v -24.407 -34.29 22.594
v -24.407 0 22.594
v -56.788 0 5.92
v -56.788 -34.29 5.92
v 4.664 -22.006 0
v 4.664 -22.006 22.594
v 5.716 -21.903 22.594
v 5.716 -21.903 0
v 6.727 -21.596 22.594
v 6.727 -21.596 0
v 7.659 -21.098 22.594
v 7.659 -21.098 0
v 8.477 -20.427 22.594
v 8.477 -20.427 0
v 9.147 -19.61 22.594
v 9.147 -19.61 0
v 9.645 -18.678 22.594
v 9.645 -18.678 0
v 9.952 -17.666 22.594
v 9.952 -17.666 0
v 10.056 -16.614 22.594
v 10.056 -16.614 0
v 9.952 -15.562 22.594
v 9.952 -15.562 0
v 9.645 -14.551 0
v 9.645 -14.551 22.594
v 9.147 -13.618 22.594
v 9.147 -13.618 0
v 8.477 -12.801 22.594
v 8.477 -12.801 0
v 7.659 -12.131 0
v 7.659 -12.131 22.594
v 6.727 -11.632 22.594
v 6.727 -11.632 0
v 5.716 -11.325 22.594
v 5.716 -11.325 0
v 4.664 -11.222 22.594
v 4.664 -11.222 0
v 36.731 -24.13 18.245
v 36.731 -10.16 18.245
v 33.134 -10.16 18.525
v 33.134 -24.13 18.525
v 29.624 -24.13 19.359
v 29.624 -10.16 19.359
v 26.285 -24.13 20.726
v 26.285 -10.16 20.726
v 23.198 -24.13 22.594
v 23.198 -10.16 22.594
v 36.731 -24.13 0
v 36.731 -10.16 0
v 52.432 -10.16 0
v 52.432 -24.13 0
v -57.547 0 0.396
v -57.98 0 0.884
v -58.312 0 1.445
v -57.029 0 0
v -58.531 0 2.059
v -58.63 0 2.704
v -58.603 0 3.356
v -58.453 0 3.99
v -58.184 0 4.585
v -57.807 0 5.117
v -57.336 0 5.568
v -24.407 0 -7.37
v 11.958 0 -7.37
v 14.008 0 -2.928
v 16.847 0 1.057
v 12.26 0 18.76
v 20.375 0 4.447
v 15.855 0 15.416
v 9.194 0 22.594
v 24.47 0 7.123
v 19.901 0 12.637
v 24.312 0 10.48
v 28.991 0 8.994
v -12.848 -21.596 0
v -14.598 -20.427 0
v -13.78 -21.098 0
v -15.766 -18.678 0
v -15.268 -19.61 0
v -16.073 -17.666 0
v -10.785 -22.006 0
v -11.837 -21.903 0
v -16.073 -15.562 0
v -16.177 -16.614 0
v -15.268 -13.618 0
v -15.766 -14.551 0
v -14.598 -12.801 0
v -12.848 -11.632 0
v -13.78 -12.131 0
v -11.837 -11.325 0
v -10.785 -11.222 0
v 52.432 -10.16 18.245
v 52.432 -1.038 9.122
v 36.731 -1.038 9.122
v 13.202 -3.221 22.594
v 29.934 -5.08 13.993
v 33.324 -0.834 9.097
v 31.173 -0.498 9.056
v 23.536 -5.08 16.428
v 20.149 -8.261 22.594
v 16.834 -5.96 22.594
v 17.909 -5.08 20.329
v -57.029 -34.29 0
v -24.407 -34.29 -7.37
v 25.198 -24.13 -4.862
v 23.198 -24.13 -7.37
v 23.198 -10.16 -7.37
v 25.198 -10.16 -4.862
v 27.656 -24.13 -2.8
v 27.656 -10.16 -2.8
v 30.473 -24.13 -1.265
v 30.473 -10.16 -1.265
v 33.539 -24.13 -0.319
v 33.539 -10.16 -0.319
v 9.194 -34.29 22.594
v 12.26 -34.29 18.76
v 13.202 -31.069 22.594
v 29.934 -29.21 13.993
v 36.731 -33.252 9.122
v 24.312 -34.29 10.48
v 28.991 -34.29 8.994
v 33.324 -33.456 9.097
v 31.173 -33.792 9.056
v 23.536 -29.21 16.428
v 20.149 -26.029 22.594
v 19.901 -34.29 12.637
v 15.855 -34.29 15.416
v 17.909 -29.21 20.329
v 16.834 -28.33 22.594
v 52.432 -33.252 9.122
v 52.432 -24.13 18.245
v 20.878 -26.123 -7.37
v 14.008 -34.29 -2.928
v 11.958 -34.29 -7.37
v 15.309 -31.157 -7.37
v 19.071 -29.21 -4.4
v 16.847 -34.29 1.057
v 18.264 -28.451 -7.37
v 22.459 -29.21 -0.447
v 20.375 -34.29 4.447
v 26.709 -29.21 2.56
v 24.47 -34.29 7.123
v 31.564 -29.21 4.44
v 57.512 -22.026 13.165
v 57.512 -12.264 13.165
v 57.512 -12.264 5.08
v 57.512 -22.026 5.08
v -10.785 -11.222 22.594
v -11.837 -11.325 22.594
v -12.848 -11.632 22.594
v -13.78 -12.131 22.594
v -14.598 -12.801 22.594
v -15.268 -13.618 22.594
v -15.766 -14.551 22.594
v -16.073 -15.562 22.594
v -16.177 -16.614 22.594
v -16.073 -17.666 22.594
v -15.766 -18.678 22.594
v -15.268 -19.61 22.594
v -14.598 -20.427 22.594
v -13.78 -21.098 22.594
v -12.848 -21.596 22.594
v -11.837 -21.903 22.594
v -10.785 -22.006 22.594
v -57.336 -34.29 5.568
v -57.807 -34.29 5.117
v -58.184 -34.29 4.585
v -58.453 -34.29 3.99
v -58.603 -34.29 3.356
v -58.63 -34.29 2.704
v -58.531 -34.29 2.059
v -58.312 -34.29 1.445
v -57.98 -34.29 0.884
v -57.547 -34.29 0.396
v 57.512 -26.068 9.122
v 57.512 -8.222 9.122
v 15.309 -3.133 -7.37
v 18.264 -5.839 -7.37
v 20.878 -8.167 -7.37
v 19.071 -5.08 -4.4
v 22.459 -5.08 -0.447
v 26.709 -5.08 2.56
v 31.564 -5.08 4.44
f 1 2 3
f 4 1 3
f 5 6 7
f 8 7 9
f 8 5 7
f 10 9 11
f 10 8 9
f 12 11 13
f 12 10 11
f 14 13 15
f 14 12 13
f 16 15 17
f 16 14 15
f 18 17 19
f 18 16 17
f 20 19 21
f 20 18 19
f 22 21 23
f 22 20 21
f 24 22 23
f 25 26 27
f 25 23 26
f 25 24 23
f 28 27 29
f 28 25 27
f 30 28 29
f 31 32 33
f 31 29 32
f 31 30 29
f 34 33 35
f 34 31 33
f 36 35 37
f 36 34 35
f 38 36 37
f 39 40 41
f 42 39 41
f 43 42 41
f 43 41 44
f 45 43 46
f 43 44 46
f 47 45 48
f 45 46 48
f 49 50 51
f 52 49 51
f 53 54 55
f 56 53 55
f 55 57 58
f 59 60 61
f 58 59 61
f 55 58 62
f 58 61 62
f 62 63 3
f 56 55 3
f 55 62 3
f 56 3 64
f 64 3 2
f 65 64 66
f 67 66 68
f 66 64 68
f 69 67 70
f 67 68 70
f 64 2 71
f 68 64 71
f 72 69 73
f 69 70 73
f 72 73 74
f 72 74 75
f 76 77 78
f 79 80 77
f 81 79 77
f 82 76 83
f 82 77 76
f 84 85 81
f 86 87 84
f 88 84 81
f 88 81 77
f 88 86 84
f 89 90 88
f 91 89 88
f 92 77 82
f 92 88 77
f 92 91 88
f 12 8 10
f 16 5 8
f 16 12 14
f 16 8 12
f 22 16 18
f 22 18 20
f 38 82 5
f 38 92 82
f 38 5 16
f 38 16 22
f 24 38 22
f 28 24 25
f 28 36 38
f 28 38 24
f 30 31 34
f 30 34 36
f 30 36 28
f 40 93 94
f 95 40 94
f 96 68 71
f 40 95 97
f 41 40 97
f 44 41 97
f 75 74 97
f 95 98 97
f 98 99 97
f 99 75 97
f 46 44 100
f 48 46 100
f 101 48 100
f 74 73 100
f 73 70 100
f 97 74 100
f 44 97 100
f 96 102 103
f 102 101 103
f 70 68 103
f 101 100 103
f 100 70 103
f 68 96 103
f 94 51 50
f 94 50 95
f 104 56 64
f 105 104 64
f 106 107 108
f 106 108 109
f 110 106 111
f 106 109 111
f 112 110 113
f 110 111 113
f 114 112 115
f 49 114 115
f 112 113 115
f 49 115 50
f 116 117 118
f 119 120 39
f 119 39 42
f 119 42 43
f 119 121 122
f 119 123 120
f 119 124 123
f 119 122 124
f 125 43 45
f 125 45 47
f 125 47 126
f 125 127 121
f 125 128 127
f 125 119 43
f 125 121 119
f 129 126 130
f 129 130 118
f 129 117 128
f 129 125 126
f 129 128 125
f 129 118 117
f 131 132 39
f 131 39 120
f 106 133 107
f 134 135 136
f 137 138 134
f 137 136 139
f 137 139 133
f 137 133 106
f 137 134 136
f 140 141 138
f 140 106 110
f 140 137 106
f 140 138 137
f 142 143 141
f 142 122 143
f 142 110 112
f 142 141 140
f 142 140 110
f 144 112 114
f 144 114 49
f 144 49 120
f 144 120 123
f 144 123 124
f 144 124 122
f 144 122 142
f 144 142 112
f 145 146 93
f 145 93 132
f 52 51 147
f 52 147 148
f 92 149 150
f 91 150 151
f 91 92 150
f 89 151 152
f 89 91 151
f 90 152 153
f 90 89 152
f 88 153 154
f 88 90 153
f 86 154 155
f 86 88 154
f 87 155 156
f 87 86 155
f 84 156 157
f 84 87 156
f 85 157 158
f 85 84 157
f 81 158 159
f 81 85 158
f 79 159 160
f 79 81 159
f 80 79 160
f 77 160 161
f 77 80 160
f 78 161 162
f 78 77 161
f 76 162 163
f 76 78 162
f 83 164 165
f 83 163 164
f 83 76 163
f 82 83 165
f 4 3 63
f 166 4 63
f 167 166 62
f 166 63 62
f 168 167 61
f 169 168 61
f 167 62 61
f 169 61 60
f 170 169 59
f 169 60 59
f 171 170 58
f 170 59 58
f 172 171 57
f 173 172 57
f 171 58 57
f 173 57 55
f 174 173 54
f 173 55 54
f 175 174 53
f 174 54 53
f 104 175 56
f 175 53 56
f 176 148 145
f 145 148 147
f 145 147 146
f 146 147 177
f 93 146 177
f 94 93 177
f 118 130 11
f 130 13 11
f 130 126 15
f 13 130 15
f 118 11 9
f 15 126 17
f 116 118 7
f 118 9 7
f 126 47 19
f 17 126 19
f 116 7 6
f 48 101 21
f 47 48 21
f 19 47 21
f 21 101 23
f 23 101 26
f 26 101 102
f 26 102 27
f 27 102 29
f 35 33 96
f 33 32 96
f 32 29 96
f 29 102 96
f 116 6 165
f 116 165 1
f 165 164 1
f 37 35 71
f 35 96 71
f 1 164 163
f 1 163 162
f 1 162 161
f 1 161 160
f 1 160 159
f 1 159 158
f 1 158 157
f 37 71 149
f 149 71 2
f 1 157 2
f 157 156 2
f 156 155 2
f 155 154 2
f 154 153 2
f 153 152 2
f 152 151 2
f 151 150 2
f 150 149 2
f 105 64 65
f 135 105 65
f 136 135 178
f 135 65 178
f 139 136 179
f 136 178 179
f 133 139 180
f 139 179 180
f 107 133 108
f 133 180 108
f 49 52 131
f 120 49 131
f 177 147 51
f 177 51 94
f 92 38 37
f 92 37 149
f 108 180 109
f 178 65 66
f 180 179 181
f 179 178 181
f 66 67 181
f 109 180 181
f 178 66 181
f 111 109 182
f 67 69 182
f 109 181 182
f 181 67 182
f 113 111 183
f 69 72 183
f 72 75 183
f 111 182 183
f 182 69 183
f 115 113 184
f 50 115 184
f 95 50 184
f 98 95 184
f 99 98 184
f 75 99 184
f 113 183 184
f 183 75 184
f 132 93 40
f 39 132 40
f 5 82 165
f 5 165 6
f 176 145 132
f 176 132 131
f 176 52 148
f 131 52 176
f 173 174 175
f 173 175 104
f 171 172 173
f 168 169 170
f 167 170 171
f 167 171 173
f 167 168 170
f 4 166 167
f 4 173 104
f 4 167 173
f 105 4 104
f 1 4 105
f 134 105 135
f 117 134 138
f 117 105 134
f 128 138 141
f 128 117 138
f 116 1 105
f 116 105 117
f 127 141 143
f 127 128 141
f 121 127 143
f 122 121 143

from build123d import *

# Parameters (mm, degrees)
F1_DEPTH     = 34.29
F2_T1_DEPTH  = 46.9101181819
F2_T4_ANGLE  = 100.0995199097
F2_T6_ANGLE  = 150.1003280787
F2_T8_ANGLE  = 150.1003280787
F2_T10_ANGLE = 100.0995199097
F4_DEPTH     = 64.008
F5_SIZE      = 5.08


# Not quite as in the source:
# - a fillet or chamfer that OpenCascade refuses, or shapes differently, is made with other operations: its cross-section is extruded or revolved along the edge and cut away or added


with BuildPart() as f1:
    # F0 (on Front) → F1 (new body)
    with BuildSketch(Plane.XZ):
        with BuildLine():
            Line((23.1983069149, 22.5941853283), (-24.4065547209, 22.5941853283))
            Line((-24.4065547209, 22.5941853283), (-56.7875248861, 5.9204018954))
            ThreePointArc((-56.7875248861, 5.9204018954), (-58.6318372817, 3.0305487818), (-57.02917908, 0))
            Line((-57.02917908, 0), (-24.4065547209, -7.3702961741))
            Line((-24.4065547209, -7.3702961741), (23.1983069149, -7.3702961741))
            ThreePointArc((23.1983069149, -7.3702961741), (29.0260188517, -1.9620688543), (36.7306560898, 0))
            Line((36.7306560898, 0), (57.5124751139, 0))
            Line((57.5124751139, 0), (57.5124751139, 18.2445040364))
            Line((57.5124751139, 18.2445040364), (36.7306560898, 18.2445040364))
            ThreePointArc((36.7306560898, 18.2445040364), (29.6235434283, 19.3586478737), (23.1983069149, 22.5941853283))
        make_face()
    extrude(amount=F1_DEPTH)

    # F2: chamfer of 10.16 on 4 edges, made by hand

    # F2_s2 → F2_t1 (cut)
    with BuildSketch(Plane.YZ.offset(36.7306560898)):
        Polygon((-24.13, 18.2445040364), (-34.29, 8.0845040364), (-34.29, 18.2445040364), align=None)
        Polygon((-24.13, 0), (-34.29, 10.16), (-34.29, 0), align=None)
        Polygon((-10.16, 0), (0, 10.16), (0, 0), align=None)
        Polygon((-10.16, 18.2445040364), (0, 8.0845040364), (0, 18.2445040364), align=None)
    extrude(amount=F2_T1_DEPTH, mode=Mode.SUBTRACT)

    # F2_s3 → F2_t4 (revolve, cut)
    with BuildSketch(Plane.YZ.offset(36.7306560898)):
        Polygon((-10.16, 18.2445040364), (0, 8.0845040364), (0, 18.2445040364), align=None)
    revolve(axis=Axis((36.7306560898, 0, 41.469677098), (0, 1, 0)), revolution_arc=F2_T4_ANGLE, mode=Mode.SUBTRACT)

    # F2_s5 → F2_t6 (revolve, cut)
    with BuildSketch(Plane(origin=(34.5645844349, 0, -19.8752542161), x_dir=(0, 1, 0), z_dir=(0.8668996033, 0, -0.4984827758))):
        Polygon((-10.16, -11.7629612563), (0, -21.9229612563), (0, -11.7629612563), align=None)
    revolve(axis=Axis((36.7306560898, 0, -16.1082902421), (0, 1, 0)), revolution_arc=F2_T6_ANGLE, mode=Mode.SUBTRACT)

    # F2_s7 → F2_t8 (revolve, cut)
    with BuildSketch(Plane(origin=(34.5645844349, 0, -19.8752542161), x_dir=(0, 1, 0), z_dir=(0.8668996033, 0, -0.4984827758))):
        Polygon((-24.13, -11.7629612563), (-34.29, -21.9229612563), (-34.29, -11.7629612563), align=None)
    revolve(axis=Axis((36.7306560898, -34.29, -16.1082902421), (0, 1, 0)), revolution_arc=F2_T8_ANGLE, mode=Mode.SUBTRACT)

    # F2_s9 → F2_t10 (revolve, cut)
    with BuildSketch(Plane.YZ.offset(36.7306560898)):
        Polygon((-24.13, 18.2445040364), (-34.29, 8.0845040364), (-34.29, 18.2445040364), align=None)
    revolve(axis=Axis((36.7306560898, -34.29, 41.469677098), (0, 1, 0)), revolution_arc=F2_T10_ANGLE, mode=Mode.SUBTRACT)

    # F3 (on Top) → F4 (cut)
    with BuildSketch(Plane.XY):
        with BuildLine():
            Line((4.6636075713, -11.2218027934), (-10.7845906168, -11.2218027934))
            ThreePointArc((-10.7845906168, -11.2218027934), (-16.1768863909, -16.6140985675), (-10.7845906168, -22.0063943416))
            Line((-10.7845906168, -22.0063943416), (4.6636075713, -22.0063943416))
            ThreePointArc((4.6636075713, -22.0063943416), (10.0559033453, -16.6140985675), (4.6636075713, -11.2218027934))
        make_face()
    extrude(amount=F4_DEPTH, mode=Mode.SUBTRACT)

    # F5
    f5_edges = [f1.edges().sort_by_distance(p)[0] for p in [
        (57.512475, -28.691126, 13.683378),
        (57.512475, -17.145, 18.244504),
        (57.512475, -5.598874, 13.683378),
        (57.512475, -17.145, 0),
        (57.512475, -28.691126, 4.561126),
        (57.512475, -5.598874, 4.561126),
    ]]
    chamfer(f5_edges, length=F5_SIZE)


solid = f1.part
